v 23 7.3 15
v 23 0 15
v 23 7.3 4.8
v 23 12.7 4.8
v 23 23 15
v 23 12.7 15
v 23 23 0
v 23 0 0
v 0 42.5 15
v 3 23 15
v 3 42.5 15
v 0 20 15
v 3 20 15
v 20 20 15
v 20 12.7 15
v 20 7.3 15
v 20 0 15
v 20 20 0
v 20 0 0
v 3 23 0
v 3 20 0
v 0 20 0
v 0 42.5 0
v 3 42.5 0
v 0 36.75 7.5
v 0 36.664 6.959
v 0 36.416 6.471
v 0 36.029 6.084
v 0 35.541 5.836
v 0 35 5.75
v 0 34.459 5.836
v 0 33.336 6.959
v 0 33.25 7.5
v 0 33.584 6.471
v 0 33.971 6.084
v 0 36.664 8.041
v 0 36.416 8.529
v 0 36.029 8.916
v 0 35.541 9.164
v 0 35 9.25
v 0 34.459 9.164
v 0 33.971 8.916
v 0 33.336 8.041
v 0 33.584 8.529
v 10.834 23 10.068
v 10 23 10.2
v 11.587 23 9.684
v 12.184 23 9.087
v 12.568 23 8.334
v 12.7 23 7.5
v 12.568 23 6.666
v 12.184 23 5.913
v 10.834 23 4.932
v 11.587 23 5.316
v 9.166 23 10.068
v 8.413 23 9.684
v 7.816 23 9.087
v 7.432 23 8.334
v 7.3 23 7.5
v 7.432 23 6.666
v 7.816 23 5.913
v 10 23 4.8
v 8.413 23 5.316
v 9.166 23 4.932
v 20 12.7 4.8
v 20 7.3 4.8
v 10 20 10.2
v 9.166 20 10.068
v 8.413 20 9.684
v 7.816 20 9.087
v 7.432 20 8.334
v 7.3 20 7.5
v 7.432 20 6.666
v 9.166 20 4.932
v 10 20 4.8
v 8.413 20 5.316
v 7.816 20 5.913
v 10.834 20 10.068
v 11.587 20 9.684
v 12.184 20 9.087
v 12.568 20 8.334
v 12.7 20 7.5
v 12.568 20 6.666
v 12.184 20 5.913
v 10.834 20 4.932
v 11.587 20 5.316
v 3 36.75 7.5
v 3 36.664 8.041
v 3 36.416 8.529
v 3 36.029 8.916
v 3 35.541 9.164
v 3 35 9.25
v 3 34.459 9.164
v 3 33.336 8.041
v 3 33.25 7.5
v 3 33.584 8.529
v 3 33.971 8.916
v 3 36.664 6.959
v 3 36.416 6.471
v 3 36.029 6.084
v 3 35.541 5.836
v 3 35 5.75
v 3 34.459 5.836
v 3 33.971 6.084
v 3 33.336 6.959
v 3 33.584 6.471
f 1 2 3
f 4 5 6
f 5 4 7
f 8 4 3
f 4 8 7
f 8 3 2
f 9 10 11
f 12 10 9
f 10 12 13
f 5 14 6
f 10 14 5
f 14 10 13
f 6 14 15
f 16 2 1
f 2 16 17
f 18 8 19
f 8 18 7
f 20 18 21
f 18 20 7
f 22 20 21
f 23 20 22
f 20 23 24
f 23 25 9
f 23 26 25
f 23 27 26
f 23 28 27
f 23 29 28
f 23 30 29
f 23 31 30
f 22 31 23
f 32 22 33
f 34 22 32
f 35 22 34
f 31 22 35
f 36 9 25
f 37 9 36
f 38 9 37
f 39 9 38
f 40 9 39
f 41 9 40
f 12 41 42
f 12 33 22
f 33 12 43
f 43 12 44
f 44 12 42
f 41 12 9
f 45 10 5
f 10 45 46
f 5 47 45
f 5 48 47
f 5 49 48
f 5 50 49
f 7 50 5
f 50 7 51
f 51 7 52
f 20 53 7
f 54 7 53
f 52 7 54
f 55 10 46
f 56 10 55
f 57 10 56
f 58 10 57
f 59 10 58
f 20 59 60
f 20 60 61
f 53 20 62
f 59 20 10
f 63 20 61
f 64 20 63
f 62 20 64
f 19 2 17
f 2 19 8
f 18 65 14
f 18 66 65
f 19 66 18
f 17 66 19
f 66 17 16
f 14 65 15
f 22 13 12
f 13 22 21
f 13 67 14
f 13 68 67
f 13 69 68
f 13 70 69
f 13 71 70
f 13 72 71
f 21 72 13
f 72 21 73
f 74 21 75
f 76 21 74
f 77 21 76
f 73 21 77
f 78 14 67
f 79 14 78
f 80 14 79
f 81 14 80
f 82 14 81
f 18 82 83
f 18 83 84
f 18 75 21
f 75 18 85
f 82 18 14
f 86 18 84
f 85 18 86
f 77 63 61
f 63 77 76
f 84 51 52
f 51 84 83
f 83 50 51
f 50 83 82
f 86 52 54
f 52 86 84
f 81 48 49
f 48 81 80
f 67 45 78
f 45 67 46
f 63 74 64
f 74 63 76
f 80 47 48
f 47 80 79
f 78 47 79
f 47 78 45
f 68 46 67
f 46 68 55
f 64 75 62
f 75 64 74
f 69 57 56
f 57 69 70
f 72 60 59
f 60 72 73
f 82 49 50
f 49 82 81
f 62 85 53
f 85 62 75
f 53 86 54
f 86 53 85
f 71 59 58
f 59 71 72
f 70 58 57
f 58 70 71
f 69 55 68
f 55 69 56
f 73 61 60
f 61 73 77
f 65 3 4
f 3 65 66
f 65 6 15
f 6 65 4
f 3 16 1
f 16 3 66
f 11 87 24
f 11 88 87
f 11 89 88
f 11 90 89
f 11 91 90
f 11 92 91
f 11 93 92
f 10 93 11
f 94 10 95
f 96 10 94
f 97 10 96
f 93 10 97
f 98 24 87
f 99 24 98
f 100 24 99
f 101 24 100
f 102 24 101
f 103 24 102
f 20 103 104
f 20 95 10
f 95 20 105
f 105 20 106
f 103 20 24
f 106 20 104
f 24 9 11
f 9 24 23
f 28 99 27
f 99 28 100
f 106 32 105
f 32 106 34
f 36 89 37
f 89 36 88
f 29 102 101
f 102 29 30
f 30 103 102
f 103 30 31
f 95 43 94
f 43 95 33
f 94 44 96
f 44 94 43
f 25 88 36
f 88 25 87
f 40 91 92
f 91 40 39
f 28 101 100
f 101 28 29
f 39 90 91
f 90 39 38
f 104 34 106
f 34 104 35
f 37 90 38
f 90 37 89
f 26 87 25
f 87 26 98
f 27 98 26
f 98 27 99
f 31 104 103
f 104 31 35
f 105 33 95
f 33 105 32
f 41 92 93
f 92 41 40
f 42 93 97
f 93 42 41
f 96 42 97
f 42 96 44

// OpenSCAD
// Aluminium extrusion variable bed mount
// by neb1, 2019, https://www.thingiverse.com/neb1/about

/* [Extrusion] */

// Extrusion size
EXT = 20; // [15:1515, 20:2020, 30:3030, 40:4040]
// Screw hole diameter for extrusion mount (e.g. 5.4mm for M5 screws)
EXT_hole_dia = 5.4; 

/* [Mount] */

// Bed distance measured from extrusion edge
s_distance = 15; 
// mount strength in (mm)
s_thickness = 3;
// Mount width (mm)
s_height = 15;
// Bed mount screw hole diameter (e.g. 3.5mm for M3)
s_hole_dia = 3.5; 

difference() {
    // support frame 
    cube([EXT+s_thickness, EXT+s_thickness, s_height]);
    // extrusion 
    translate([-1,-1,-50]) cube([EXT+1, EXT+1, 100]);
    
    // extrusion mount hole
    translate([EXT/2, EXT-1, s_height/2])
        rotate([-90,0,0])
            cylinder(d=EXT_hole_dia, h=s_thickness+2, $fn=20);
    
    // slide-in-mount
    translate([EXT-1, (EXT-EXT_hole_dia)/2, (s_height-EXT_hole_dia)/2])
        cube([s_thickness+2, EXT_hole_dia, s_height/2 + s_hole_dia]);
}

translate([0, EXT, 0]) {
    difference() {
        cube([s_thickness, s_distance + s_height/2, s_height]);
        
        // cutout for bedmount screw hole
        translate([-1, s_distance, s_height/2]) {
            rotate([0, 90, 0]) {
                cylinder(d=s_hole_dia, h=s_thickness+2, $fn=20);
            }
        }
    }
}
